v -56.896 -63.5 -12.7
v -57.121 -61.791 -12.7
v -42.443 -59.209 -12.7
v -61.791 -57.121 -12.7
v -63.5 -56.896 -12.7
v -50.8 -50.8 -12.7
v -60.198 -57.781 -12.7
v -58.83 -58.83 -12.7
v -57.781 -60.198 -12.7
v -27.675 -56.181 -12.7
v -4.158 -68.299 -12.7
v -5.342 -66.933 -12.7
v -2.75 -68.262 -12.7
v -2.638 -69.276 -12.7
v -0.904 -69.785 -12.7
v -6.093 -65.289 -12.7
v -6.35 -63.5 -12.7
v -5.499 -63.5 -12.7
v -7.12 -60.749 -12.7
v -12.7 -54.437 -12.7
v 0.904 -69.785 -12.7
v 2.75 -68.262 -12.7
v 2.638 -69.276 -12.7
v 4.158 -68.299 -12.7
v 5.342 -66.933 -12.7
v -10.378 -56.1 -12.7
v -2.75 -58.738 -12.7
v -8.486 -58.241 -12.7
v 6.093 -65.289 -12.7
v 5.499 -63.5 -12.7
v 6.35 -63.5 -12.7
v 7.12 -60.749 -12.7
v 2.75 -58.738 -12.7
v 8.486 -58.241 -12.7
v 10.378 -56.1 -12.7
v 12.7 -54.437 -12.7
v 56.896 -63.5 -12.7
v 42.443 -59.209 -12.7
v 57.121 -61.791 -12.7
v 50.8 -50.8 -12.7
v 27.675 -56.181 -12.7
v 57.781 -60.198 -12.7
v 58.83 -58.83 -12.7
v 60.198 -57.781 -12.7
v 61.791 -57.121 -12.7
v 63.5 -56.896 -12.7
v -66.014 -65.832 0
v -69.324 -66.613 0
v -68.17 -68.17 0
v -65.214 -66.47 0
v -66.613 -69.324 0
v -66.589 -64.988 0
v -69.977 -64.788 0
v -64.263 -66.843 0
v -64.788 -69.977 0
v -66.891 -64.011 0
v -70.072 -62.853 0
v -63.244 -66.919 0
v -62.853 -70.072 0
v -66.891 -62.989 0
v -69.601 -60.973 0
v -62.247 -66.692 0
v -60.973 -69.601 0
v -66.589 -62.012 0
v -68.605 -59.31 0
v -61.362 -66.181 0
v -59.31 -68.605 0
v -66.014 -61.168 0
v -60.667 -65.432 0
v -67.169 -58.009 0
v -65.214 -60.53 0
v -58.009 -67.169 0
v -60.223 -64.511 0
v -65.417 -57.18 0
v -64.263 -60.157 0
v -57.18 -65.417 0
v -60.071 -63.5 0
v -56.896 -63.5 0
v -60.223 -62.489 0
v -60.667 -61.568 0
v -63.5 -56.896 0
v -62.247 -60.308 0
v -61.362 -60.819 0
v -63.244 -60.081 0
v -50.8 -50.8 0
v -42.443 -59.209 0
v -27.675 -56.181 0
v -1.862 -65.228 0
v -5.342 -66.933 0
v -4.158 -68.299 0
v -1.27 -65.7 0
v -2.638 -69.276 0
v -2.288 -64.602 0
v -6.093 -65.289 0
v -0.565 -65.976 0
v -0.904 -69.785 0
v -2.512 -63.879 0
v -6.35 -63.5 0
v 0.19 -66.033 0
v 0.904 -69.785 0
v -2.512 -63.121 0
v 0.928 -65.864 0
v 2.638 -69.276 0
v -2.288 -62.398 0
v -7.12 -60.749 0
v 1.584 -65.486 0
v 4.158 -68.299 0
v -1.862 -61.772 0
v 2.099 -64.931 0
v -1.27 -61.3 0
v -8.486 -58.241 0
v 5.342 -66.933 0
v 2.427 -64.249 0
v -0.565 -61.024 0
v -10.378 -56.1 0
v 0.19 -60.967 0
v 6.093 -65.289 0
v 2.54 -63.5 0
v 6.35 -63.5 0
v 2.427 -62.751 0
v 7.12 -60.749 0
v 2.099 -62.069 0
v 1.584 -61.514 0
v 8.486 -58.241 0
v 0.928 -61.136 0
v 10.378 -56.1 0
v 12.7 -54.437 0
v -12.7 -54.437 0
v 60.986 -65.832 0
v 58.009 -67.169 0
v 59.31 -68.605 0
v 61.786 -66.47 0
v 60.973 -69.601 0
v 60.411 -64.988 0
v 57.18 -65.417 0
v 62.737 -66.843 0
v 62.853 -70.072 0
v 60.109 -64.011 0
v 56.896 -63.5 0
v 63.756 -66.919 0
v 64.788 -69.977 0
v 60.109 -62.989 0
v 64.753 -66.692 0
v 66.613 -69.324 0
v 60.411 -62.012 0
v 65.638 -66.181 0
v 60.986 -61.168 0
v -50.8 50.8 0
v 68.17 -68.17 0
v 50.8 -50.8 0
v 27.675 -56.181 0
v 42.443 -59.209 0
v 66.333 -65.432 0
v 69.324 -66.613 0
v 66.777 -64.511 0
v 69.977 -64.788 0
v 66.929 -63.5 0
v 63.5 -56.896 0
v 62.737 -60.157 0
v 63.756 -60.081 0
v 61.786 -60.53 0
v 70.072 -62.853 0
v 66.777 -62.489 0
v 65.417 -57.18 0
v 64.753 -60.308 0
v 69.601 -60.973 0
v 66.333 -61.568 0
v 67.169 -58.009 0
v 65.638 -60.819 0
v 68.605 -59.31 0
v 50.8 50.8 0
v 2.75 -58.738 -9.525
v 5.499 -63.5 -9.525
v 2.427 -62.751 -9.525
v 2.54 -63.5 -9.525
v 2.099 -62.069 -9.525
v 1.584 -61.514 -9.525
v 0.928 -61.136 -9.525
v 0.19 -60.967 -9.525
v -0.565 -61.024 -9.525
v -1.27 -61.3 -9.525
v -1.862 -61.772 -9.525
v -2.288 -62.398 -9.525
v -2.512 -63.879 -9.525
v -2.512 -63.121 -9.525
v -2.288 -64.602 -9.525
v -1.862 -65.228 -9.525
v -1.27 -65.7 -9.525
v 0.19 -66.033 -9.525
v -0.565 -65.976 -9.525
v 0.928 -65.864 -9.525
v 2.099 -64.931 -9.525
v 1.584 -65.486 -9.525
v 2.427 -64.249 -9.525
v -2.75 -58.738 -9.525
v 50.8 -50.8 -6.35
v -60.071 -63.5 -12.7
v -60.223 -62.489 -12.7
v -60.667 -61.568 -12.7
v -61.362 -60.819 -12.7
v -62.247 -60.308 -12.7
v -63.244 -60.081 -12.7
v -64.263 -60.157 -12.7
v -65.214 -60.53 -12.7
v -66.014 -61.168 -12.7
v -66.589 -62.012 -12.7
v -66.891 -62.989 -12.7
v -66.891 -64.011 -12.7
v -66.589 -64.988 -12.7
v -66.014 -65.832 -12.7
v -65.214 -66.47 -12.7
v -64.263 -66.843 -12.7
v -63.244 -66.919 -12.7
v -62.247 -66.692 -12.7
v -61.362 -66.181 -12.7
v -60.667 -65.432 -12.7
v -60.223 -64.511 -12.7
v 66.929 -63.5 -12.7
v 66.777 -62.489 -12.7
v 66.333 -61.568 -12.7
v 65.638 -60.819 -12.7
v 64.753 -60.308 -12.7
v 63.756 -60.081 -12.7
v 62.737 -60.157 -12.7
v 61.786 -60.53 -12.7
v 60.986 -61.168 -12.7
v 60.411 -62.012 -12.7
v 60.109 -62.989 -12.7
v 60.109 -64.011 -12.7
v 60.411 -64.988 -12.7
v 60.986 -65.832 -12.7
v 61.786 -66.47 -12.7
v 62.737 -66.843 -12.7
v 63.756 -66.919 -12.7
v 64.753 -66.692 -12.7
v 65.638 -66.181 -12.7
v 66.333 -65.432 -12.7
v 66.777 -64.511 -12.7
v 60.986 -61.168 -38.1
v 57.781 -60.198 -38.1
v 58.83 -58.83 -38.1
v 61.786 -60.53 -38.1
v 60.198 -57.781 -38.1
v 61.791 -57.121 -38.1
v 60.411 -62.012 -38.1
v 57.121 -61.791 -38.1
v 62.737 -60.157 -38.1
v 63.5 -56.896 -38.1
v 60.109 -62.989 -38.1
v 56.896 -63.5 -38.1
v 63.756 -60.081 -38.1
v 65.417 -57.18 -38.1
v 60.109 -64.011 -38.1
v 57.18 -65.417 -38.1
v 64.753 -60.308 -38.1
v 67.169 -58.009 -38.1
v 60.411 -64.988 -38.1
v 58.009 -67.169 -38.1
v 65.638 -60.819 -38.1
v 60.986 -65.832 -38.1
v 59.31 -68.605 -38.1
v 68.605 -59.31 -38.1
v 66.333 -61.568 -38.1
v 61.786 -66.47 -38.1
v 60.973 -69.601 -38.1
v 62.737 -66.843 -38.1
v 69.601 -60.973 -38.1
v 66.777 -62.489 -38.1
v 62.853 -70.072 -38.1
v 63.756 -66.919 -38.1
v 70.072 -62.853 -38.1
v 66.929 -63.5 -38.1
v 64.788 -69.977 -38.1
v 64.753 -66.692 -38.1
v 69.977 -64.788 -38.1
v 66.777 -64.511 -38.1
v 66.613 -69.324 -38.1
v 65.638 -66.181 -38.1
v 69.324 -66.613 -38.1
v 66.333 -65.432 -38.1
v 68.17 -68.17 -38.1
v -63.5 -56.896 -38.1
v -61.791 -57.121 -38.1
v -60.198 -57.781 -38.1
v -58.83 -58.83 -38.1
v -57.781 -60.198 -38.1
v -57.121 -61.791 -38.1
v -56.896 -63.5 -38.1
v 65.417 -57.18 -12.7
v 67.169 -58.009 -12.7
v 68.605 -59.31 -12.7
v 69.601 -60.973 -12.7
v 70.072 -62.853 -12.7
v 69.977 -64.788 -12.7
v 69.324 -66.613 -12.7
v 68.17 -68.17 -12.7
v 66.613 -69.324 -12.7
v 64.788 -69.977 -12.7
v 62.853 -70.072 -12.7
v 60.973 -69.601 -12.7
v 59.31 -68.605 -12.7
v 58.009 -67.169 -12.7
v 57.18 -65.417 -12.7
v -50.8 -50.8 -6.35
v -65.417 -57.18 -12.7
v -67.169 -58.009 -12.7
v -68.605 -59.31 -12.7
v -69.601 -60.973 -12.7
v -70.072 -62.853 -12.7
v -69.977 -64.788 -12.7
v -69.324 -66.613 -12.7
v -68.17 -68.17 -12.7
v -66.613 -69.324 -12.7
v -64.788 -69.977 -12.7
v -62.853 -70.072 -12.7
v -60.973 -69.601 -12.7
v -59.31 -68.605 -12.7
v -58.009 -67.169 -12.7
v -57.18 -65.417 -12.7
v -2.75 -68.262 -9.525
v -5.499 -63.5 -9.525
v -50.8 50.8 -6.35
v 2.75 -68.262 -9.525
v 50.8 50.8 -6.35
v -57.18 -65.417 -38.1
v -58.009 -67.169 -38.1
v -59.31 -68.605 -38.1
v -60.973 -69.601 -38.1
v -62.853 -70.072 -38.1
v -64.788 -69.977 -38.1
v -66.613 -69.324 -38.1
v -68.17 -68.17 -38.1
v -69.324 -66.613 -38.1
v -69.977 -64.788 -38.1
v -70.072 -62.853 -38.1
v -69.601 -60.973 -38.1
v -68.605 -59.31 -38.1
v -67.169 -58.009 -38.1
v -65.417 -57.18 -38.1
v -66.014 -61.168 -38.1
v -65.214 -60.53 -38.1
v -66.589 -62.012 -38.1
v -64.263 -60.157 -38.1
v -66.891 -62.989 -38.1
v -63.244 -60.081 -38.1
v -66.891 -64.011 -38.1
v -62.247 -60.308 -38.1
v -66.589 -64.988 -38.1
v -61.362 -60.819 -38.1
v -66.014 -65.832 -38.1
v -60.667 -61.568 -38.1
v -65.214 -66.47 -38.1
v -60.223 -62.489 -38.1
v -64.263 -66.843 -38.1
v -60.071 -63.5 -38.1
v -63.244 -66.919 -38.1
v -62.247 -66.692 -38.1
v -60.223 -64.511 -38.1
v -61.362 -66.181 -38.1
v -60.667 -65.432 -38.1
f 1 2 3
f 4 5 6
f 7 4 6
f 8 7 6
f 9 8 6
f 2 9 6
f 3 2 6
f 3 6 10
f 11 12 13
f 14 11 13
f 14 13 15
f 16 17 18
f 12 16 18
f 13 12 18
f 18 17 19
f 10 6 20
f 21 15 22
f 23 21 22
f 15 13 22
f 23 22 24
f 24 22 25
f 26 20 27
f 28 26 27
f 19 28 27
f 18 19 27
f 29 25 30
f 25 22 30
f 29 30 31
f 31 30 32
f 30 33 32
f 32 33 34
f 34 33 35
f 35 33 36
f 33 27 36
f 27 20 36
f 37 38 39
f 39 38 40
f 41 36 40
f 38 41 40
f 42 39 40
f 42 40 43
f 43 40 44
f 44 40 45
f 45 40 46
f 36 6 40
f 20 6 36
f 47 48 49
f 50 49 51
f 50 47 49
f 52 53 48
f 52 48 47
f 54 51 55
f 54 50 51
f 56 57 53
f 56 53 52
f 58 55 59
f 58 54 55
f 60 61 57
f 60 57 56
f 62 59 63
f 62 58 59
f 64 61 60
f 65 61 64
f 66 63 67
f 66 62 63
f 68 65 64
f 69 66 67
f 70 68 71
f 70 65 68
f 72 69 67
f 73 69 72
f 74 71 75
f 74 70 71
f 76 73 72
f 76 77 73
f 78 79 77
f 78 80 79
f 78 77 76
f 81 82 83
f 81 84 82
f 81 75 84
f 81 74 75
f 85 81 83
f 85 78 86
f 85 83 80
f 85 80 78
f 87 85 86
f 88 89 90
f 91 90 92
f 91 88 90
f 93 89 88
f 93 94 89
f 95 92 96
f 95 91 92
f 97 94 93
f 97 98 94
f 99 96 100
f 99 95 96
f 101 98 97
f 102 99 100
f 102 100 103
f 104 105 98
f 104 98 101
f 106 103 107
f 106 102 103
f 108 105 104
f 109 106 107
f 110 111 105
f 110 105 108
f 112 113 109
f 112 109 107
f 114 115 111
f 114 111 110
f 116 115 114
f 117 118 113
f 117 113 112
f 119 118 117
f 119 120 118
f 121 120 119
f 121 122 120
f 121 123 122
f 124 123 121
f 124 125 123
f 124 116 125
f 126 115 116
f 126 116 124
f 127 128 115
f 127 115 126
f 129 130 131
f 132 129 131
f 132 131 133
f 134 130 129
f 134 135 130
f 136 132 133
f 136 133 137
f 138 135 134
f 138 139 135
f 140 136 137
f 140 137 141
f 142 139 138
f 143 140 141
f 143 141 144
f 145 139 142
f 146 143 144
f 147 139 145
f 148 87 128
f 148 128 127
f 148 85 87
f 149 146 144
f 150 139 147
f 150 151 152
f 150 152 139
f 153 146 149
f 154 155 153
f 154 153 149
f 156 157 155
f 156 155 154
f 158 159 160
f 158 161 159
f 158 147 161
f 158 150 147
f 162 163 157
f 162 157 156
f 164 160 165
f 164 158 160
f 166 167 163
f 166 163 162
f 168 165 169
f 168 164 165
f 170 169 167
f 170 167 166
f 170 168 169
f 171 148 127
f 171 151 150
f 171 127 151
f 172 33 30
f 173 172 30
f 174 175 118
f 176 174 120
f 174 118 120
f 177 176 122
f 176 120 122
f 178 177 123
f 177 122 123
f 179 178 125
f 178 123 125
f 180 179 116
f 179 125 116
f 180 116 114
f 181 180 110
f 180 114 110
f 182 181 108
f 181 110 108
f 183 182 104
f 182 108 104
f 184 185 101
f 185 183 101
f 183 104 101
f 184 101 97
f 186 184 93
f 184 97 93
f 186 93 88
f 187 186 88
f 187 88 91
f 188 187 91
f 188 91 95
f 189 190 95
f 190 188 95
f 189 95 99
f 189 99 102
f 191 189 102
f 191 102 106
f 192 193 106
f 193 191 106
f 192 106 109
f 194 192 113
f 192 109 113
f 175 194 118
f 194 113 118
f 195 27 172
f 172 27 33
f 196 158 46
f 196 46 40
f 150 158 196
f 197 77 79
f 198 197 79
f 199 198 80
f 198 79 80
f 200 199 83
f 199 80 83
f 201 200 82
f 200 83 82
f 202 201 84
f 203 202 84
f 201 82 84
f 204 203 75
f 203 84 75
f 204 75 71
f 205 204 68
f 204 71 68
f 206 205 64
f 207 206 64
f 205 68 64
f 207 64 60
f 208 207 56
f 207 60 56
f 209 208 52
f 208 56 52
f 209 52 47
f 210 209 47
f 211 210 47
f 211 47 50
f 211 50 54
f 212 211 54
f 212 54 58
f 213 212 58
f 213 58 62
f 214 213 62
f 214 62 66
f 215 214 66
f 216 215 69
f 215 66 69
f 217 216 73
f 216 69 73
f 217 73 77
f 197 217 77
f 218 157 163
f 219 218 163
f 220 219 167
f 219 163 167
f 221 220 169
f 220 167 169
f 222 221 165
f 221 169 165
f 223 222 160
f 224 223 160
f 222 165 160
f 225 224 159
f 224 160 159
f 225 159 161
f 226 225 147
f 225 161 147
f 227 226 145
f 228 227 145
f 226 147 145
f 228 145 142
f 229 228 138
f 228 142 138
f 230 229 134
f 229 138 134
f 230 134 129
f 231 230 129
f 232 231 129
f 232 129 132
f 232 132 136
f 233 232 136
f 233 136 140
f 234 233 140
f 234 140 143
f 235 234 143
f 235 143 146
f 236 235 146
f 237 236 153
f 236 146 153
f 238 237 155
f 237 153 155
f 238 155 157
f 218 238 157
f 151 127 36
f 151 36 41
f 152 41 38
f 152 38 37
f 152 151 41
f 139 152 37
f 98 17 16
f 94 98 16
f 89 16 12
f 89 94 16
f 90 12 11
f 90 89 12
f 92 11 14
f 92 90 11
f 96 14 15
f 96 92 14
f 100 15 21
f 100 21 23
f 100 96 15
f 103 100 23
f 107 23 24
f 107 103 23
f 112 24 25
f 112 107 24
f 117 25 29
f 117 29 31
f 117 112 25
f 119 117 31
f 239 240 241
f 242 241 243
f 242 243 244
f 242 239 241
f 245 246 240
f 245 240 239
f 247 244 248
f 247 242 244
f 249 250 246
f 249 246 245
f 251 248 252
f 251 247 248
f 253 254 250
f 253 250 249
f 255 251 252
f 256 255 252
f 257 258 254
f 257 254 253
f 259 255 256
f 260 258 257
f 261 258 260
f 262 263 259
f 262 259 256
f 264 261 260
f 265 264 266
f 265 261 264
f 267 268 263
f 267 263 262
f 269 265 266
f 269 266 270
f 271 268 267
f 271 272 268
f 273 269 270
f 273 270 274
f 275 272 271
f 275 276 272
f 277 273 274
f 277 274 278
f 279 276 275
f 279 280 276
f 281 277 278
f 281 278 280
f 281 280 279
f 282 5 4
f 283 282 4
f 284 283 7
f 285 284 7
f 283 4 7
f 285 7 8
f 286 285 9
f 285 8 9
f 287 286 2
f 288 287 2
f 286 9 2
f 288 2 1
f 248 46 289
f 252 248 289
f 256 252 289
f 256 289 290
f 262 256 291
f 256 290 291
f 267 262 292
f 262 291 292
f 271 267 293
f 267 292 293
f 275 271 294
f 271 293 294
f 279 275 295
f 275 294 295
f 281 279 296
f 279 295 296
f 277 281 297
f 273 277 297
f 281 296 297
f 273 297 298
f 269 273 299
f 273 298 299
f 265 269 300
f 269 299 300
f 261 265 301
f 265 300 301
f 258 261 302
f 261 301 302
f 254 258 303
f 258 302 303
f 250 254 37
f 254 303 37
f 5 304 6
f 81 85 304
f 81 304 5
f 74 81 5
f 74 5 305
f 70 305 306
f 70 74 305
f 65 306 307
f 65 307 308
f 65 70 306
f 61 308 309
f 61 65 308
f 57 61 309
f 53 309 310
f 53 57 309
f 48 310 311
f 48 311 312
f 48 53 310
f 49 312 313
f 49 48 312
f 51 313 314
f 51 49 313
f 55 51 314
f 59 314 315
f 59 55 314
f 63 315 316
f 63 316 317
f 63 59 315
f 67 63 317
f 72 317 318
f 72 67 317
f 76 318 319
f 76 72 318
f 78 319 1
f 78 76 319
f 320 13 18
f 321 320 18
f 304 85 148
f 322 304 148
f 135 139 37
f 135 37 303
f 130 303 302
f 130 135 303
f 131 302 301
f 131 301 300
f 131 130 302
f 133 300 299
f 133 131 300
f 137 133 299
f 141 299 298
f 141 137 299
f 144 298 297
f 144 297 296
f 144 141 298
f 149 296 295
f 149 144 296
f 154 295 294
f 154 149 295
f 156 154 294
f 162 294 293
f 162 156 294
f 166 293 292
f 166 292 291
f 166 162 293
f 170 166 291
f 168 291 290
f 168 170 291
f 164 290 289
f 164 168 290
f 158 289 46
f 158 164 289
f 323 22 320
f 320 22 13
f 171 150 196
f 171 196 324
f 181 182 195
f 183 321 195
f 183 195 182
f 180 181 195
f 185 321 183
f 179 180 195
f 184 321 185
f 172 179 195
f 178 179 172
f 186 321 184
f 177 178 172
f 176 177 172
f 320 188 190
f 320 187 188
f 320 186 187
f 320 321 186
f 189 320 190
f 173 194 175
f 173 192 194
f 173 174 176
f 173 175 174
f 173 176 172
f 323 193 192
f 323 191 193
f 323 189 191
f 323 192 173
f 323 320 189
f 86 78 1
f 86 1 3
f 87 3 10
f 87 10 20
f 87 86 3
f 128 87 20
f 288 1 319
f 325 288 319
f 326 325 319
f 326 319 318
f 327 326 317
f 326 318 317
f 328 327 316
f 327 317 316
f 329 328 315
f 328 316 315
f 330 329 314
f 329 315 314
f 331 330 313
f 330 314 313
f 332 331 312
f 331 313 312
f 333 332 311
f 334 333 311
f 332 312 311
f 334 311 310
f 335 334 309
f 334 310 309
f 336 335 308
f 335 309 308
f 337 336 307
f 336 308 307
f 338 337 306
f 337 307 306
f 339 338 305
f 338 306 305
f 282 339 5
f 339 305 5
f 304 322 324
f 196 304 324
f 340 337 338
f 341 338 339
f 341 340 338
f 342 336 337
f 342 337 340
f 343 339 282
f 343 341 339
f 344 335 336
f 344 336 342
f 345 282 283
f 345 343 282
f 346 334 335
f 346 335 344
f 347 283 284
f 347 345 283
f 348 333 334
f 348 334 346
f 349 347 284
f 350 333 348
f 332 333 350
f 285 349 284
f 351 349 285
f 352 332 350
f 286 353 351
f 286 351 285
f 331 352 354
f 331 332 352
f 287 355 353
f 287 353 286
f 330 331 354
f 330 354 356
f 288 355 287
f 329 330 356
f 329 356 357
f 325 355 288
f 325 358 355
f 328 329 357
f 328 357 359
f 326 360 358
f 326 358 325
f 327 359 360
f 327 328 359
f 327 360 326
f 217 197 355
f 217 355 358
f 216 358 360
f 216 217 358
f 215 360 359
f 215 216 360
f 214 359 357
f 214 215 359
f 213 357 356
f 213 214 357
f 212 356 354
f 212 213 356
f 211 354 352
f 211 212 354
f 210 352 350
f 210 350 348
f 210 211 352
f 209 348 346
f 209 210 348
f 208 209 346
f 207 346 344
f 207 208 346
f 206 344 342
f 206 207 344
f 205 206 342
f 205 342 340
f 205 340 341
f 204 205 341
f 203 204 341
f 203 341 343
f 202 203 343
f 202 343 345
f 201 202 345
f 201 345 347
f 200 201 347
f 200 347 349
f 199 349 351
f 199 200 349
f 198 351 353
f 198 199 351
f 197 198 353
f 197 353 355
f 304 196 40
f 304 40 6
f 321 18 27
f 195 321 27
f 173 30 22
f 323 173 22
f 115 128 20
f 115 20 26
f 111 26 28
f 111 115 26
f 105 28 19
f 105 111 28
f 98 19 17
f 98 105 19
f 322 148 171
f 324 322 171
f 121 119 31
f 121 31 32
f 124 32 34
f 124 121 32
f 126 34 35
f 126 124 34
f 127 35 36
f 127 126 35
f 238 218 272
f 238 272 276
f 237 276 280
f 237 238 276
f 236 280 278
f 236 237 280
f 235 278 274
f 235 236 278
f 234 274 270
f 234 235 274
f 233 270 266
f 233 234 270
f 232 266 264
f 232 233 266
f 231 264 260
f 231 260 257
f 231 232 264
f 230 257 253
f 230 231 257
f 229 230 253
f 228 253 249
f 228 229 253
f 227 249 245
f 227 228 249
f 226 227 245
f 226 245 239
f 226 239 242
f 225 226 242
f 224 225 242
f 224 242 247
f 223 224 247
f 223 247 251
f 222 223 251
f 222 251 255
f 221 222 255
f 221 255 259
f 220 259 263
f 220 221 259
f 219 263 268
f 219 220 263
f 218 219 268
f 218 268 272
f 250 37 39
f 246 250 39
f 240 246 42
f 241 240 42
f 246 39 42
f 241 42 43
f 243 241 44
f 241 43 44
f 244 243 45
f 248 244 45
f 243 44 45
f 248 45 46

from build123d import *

# Parameters (mm, degrees)
F0_W     = 101.6
F0_H     = 101.6
F1_DEPTH = 6.35
F2_R     = 3.429
F2_R_2   = 2.54
F3_DEPTH = 12.7
F4_R     = 3.429
F5_DEPTH = 25.4
F6_R     = 2.54
F7_DEPTH = 3.175


with BuildPart() as f1:
    # F0 (on Top) → F1 (new body)
    with BuildSketch(Plane.XY):
        Rectangle(F0_W, F0_H)
    extrude(amount=-F1_DEPTH)

    # F2 (on face) → F3 (join)
    with BuildSketch(Plane.XY):
        with BuildLine():
            Line((-50.8, -50.8), (-63.5, -56.896))
            ThreePointArc((-63.5, -56.896), (-68.169733183, -68.169733183), (-56.896, -63.5))
            ThreePointArc((-56.896, -63.5), (-35.0917960505, -57.5358809514), (-12.7, -54.4372529439))
            ThreePointArc((-12.7, -54.4372529439), (-8.4860183708, -58.2406426383), (-6.35, -63.5))
            ThreePointArc((-6.35, -63.5), (0, -57.15), (6.35, -63.5))
            ThreePointArc((6.35, -63.5), (8.4860183708, -58.2406426383), (12.7, -54.4372529439))
            ThreePointArc((12.7, -54.4372529439), (35.0917960505, -57.5358809514), (56.896, -63.5))
            ThreePointArc((56.896, -63.5), (68.169733183, -68.169733183), (63.5, -56.896))
            Line((63.5, -56.896), (50.8, -50.8))
            Line((50.8, -50.8), (-50.8, -50.8))
        make_face()
        with Locations((-63.5, -63.5)):
            Circle(F2_R, mode=Mode.SUBTRACT)
        with Locations((63.5, -63.5)):
            Circle(F2_R, mode=Mode.SUBTRACT)
        with BuildLine():
            ThreePointArc((6.35, -63.5), (0, -57.15), (-6.35, -63.5))
            ThreePointArc((-6.35, -63.5), (0, -69.85), (6.35, -63.5))
        make_face()
        with Locations((0, -63.5)):
            Circle(F2_R_2, mode=Mode.SUBTRACT)
    extrude(amount=-F3_DEPTH)

    # F4 (on face) → F5 (join)
    with BuildSketch(Plane(origin=(0, 0, -12.7), x_dir=(1, 0, 0), z_dir=(0, 0, -1))):
        with BuildLine():
            ThreePointArc((-56.896, 63.5), (-68.169733183, 68.169733183), (-63.5, 56.896))
            ThreePointArc((-63.5, 56.896), (-58.830266817, 58.830266817), (-56.896, 63.5))
        make_face()
        with Locations((-63.5, 63.5)):
            Circle(F4_R, mode=Mode.SUBTRACT)
        with BuildLine():
            ThreePointArc((56.896, 63.5), (58.830266817, 58.830266817), (63.5, 56.896))
            ThreePointArc((63.5, 56.896), (68.169733183, 68.169733183), (56.896, 63.5))
        make_face()
        with Locations((63.5, 63.5)):
            Circle(F4_R, mode=Mode.SUBTRACT)
    extrude(amount=F5_DEPTH)

    # F6 (on face) → F7 (cut)
    with BuildSketch(Plane(origin=(0, 0, -12.7), x_dir=(1, 0, 0), z_dir=(0, 0, -1))):
        Polygon((2.749630657, 68.2625), (-2.749630657, 68.2625), (-5.499261314, 63.5), (-2.749630657, 58.7375), (2.749630657, 58.7375), (5.499261314, 63.5), align=None)
        with Locations((0, 63.5)):
            Circle(F6_R, mode=Mode.SUBTRACT)
    extrude(amount=-F7_DEPTH, mode=Mode.SUBTRACT)


solid = f1.part
